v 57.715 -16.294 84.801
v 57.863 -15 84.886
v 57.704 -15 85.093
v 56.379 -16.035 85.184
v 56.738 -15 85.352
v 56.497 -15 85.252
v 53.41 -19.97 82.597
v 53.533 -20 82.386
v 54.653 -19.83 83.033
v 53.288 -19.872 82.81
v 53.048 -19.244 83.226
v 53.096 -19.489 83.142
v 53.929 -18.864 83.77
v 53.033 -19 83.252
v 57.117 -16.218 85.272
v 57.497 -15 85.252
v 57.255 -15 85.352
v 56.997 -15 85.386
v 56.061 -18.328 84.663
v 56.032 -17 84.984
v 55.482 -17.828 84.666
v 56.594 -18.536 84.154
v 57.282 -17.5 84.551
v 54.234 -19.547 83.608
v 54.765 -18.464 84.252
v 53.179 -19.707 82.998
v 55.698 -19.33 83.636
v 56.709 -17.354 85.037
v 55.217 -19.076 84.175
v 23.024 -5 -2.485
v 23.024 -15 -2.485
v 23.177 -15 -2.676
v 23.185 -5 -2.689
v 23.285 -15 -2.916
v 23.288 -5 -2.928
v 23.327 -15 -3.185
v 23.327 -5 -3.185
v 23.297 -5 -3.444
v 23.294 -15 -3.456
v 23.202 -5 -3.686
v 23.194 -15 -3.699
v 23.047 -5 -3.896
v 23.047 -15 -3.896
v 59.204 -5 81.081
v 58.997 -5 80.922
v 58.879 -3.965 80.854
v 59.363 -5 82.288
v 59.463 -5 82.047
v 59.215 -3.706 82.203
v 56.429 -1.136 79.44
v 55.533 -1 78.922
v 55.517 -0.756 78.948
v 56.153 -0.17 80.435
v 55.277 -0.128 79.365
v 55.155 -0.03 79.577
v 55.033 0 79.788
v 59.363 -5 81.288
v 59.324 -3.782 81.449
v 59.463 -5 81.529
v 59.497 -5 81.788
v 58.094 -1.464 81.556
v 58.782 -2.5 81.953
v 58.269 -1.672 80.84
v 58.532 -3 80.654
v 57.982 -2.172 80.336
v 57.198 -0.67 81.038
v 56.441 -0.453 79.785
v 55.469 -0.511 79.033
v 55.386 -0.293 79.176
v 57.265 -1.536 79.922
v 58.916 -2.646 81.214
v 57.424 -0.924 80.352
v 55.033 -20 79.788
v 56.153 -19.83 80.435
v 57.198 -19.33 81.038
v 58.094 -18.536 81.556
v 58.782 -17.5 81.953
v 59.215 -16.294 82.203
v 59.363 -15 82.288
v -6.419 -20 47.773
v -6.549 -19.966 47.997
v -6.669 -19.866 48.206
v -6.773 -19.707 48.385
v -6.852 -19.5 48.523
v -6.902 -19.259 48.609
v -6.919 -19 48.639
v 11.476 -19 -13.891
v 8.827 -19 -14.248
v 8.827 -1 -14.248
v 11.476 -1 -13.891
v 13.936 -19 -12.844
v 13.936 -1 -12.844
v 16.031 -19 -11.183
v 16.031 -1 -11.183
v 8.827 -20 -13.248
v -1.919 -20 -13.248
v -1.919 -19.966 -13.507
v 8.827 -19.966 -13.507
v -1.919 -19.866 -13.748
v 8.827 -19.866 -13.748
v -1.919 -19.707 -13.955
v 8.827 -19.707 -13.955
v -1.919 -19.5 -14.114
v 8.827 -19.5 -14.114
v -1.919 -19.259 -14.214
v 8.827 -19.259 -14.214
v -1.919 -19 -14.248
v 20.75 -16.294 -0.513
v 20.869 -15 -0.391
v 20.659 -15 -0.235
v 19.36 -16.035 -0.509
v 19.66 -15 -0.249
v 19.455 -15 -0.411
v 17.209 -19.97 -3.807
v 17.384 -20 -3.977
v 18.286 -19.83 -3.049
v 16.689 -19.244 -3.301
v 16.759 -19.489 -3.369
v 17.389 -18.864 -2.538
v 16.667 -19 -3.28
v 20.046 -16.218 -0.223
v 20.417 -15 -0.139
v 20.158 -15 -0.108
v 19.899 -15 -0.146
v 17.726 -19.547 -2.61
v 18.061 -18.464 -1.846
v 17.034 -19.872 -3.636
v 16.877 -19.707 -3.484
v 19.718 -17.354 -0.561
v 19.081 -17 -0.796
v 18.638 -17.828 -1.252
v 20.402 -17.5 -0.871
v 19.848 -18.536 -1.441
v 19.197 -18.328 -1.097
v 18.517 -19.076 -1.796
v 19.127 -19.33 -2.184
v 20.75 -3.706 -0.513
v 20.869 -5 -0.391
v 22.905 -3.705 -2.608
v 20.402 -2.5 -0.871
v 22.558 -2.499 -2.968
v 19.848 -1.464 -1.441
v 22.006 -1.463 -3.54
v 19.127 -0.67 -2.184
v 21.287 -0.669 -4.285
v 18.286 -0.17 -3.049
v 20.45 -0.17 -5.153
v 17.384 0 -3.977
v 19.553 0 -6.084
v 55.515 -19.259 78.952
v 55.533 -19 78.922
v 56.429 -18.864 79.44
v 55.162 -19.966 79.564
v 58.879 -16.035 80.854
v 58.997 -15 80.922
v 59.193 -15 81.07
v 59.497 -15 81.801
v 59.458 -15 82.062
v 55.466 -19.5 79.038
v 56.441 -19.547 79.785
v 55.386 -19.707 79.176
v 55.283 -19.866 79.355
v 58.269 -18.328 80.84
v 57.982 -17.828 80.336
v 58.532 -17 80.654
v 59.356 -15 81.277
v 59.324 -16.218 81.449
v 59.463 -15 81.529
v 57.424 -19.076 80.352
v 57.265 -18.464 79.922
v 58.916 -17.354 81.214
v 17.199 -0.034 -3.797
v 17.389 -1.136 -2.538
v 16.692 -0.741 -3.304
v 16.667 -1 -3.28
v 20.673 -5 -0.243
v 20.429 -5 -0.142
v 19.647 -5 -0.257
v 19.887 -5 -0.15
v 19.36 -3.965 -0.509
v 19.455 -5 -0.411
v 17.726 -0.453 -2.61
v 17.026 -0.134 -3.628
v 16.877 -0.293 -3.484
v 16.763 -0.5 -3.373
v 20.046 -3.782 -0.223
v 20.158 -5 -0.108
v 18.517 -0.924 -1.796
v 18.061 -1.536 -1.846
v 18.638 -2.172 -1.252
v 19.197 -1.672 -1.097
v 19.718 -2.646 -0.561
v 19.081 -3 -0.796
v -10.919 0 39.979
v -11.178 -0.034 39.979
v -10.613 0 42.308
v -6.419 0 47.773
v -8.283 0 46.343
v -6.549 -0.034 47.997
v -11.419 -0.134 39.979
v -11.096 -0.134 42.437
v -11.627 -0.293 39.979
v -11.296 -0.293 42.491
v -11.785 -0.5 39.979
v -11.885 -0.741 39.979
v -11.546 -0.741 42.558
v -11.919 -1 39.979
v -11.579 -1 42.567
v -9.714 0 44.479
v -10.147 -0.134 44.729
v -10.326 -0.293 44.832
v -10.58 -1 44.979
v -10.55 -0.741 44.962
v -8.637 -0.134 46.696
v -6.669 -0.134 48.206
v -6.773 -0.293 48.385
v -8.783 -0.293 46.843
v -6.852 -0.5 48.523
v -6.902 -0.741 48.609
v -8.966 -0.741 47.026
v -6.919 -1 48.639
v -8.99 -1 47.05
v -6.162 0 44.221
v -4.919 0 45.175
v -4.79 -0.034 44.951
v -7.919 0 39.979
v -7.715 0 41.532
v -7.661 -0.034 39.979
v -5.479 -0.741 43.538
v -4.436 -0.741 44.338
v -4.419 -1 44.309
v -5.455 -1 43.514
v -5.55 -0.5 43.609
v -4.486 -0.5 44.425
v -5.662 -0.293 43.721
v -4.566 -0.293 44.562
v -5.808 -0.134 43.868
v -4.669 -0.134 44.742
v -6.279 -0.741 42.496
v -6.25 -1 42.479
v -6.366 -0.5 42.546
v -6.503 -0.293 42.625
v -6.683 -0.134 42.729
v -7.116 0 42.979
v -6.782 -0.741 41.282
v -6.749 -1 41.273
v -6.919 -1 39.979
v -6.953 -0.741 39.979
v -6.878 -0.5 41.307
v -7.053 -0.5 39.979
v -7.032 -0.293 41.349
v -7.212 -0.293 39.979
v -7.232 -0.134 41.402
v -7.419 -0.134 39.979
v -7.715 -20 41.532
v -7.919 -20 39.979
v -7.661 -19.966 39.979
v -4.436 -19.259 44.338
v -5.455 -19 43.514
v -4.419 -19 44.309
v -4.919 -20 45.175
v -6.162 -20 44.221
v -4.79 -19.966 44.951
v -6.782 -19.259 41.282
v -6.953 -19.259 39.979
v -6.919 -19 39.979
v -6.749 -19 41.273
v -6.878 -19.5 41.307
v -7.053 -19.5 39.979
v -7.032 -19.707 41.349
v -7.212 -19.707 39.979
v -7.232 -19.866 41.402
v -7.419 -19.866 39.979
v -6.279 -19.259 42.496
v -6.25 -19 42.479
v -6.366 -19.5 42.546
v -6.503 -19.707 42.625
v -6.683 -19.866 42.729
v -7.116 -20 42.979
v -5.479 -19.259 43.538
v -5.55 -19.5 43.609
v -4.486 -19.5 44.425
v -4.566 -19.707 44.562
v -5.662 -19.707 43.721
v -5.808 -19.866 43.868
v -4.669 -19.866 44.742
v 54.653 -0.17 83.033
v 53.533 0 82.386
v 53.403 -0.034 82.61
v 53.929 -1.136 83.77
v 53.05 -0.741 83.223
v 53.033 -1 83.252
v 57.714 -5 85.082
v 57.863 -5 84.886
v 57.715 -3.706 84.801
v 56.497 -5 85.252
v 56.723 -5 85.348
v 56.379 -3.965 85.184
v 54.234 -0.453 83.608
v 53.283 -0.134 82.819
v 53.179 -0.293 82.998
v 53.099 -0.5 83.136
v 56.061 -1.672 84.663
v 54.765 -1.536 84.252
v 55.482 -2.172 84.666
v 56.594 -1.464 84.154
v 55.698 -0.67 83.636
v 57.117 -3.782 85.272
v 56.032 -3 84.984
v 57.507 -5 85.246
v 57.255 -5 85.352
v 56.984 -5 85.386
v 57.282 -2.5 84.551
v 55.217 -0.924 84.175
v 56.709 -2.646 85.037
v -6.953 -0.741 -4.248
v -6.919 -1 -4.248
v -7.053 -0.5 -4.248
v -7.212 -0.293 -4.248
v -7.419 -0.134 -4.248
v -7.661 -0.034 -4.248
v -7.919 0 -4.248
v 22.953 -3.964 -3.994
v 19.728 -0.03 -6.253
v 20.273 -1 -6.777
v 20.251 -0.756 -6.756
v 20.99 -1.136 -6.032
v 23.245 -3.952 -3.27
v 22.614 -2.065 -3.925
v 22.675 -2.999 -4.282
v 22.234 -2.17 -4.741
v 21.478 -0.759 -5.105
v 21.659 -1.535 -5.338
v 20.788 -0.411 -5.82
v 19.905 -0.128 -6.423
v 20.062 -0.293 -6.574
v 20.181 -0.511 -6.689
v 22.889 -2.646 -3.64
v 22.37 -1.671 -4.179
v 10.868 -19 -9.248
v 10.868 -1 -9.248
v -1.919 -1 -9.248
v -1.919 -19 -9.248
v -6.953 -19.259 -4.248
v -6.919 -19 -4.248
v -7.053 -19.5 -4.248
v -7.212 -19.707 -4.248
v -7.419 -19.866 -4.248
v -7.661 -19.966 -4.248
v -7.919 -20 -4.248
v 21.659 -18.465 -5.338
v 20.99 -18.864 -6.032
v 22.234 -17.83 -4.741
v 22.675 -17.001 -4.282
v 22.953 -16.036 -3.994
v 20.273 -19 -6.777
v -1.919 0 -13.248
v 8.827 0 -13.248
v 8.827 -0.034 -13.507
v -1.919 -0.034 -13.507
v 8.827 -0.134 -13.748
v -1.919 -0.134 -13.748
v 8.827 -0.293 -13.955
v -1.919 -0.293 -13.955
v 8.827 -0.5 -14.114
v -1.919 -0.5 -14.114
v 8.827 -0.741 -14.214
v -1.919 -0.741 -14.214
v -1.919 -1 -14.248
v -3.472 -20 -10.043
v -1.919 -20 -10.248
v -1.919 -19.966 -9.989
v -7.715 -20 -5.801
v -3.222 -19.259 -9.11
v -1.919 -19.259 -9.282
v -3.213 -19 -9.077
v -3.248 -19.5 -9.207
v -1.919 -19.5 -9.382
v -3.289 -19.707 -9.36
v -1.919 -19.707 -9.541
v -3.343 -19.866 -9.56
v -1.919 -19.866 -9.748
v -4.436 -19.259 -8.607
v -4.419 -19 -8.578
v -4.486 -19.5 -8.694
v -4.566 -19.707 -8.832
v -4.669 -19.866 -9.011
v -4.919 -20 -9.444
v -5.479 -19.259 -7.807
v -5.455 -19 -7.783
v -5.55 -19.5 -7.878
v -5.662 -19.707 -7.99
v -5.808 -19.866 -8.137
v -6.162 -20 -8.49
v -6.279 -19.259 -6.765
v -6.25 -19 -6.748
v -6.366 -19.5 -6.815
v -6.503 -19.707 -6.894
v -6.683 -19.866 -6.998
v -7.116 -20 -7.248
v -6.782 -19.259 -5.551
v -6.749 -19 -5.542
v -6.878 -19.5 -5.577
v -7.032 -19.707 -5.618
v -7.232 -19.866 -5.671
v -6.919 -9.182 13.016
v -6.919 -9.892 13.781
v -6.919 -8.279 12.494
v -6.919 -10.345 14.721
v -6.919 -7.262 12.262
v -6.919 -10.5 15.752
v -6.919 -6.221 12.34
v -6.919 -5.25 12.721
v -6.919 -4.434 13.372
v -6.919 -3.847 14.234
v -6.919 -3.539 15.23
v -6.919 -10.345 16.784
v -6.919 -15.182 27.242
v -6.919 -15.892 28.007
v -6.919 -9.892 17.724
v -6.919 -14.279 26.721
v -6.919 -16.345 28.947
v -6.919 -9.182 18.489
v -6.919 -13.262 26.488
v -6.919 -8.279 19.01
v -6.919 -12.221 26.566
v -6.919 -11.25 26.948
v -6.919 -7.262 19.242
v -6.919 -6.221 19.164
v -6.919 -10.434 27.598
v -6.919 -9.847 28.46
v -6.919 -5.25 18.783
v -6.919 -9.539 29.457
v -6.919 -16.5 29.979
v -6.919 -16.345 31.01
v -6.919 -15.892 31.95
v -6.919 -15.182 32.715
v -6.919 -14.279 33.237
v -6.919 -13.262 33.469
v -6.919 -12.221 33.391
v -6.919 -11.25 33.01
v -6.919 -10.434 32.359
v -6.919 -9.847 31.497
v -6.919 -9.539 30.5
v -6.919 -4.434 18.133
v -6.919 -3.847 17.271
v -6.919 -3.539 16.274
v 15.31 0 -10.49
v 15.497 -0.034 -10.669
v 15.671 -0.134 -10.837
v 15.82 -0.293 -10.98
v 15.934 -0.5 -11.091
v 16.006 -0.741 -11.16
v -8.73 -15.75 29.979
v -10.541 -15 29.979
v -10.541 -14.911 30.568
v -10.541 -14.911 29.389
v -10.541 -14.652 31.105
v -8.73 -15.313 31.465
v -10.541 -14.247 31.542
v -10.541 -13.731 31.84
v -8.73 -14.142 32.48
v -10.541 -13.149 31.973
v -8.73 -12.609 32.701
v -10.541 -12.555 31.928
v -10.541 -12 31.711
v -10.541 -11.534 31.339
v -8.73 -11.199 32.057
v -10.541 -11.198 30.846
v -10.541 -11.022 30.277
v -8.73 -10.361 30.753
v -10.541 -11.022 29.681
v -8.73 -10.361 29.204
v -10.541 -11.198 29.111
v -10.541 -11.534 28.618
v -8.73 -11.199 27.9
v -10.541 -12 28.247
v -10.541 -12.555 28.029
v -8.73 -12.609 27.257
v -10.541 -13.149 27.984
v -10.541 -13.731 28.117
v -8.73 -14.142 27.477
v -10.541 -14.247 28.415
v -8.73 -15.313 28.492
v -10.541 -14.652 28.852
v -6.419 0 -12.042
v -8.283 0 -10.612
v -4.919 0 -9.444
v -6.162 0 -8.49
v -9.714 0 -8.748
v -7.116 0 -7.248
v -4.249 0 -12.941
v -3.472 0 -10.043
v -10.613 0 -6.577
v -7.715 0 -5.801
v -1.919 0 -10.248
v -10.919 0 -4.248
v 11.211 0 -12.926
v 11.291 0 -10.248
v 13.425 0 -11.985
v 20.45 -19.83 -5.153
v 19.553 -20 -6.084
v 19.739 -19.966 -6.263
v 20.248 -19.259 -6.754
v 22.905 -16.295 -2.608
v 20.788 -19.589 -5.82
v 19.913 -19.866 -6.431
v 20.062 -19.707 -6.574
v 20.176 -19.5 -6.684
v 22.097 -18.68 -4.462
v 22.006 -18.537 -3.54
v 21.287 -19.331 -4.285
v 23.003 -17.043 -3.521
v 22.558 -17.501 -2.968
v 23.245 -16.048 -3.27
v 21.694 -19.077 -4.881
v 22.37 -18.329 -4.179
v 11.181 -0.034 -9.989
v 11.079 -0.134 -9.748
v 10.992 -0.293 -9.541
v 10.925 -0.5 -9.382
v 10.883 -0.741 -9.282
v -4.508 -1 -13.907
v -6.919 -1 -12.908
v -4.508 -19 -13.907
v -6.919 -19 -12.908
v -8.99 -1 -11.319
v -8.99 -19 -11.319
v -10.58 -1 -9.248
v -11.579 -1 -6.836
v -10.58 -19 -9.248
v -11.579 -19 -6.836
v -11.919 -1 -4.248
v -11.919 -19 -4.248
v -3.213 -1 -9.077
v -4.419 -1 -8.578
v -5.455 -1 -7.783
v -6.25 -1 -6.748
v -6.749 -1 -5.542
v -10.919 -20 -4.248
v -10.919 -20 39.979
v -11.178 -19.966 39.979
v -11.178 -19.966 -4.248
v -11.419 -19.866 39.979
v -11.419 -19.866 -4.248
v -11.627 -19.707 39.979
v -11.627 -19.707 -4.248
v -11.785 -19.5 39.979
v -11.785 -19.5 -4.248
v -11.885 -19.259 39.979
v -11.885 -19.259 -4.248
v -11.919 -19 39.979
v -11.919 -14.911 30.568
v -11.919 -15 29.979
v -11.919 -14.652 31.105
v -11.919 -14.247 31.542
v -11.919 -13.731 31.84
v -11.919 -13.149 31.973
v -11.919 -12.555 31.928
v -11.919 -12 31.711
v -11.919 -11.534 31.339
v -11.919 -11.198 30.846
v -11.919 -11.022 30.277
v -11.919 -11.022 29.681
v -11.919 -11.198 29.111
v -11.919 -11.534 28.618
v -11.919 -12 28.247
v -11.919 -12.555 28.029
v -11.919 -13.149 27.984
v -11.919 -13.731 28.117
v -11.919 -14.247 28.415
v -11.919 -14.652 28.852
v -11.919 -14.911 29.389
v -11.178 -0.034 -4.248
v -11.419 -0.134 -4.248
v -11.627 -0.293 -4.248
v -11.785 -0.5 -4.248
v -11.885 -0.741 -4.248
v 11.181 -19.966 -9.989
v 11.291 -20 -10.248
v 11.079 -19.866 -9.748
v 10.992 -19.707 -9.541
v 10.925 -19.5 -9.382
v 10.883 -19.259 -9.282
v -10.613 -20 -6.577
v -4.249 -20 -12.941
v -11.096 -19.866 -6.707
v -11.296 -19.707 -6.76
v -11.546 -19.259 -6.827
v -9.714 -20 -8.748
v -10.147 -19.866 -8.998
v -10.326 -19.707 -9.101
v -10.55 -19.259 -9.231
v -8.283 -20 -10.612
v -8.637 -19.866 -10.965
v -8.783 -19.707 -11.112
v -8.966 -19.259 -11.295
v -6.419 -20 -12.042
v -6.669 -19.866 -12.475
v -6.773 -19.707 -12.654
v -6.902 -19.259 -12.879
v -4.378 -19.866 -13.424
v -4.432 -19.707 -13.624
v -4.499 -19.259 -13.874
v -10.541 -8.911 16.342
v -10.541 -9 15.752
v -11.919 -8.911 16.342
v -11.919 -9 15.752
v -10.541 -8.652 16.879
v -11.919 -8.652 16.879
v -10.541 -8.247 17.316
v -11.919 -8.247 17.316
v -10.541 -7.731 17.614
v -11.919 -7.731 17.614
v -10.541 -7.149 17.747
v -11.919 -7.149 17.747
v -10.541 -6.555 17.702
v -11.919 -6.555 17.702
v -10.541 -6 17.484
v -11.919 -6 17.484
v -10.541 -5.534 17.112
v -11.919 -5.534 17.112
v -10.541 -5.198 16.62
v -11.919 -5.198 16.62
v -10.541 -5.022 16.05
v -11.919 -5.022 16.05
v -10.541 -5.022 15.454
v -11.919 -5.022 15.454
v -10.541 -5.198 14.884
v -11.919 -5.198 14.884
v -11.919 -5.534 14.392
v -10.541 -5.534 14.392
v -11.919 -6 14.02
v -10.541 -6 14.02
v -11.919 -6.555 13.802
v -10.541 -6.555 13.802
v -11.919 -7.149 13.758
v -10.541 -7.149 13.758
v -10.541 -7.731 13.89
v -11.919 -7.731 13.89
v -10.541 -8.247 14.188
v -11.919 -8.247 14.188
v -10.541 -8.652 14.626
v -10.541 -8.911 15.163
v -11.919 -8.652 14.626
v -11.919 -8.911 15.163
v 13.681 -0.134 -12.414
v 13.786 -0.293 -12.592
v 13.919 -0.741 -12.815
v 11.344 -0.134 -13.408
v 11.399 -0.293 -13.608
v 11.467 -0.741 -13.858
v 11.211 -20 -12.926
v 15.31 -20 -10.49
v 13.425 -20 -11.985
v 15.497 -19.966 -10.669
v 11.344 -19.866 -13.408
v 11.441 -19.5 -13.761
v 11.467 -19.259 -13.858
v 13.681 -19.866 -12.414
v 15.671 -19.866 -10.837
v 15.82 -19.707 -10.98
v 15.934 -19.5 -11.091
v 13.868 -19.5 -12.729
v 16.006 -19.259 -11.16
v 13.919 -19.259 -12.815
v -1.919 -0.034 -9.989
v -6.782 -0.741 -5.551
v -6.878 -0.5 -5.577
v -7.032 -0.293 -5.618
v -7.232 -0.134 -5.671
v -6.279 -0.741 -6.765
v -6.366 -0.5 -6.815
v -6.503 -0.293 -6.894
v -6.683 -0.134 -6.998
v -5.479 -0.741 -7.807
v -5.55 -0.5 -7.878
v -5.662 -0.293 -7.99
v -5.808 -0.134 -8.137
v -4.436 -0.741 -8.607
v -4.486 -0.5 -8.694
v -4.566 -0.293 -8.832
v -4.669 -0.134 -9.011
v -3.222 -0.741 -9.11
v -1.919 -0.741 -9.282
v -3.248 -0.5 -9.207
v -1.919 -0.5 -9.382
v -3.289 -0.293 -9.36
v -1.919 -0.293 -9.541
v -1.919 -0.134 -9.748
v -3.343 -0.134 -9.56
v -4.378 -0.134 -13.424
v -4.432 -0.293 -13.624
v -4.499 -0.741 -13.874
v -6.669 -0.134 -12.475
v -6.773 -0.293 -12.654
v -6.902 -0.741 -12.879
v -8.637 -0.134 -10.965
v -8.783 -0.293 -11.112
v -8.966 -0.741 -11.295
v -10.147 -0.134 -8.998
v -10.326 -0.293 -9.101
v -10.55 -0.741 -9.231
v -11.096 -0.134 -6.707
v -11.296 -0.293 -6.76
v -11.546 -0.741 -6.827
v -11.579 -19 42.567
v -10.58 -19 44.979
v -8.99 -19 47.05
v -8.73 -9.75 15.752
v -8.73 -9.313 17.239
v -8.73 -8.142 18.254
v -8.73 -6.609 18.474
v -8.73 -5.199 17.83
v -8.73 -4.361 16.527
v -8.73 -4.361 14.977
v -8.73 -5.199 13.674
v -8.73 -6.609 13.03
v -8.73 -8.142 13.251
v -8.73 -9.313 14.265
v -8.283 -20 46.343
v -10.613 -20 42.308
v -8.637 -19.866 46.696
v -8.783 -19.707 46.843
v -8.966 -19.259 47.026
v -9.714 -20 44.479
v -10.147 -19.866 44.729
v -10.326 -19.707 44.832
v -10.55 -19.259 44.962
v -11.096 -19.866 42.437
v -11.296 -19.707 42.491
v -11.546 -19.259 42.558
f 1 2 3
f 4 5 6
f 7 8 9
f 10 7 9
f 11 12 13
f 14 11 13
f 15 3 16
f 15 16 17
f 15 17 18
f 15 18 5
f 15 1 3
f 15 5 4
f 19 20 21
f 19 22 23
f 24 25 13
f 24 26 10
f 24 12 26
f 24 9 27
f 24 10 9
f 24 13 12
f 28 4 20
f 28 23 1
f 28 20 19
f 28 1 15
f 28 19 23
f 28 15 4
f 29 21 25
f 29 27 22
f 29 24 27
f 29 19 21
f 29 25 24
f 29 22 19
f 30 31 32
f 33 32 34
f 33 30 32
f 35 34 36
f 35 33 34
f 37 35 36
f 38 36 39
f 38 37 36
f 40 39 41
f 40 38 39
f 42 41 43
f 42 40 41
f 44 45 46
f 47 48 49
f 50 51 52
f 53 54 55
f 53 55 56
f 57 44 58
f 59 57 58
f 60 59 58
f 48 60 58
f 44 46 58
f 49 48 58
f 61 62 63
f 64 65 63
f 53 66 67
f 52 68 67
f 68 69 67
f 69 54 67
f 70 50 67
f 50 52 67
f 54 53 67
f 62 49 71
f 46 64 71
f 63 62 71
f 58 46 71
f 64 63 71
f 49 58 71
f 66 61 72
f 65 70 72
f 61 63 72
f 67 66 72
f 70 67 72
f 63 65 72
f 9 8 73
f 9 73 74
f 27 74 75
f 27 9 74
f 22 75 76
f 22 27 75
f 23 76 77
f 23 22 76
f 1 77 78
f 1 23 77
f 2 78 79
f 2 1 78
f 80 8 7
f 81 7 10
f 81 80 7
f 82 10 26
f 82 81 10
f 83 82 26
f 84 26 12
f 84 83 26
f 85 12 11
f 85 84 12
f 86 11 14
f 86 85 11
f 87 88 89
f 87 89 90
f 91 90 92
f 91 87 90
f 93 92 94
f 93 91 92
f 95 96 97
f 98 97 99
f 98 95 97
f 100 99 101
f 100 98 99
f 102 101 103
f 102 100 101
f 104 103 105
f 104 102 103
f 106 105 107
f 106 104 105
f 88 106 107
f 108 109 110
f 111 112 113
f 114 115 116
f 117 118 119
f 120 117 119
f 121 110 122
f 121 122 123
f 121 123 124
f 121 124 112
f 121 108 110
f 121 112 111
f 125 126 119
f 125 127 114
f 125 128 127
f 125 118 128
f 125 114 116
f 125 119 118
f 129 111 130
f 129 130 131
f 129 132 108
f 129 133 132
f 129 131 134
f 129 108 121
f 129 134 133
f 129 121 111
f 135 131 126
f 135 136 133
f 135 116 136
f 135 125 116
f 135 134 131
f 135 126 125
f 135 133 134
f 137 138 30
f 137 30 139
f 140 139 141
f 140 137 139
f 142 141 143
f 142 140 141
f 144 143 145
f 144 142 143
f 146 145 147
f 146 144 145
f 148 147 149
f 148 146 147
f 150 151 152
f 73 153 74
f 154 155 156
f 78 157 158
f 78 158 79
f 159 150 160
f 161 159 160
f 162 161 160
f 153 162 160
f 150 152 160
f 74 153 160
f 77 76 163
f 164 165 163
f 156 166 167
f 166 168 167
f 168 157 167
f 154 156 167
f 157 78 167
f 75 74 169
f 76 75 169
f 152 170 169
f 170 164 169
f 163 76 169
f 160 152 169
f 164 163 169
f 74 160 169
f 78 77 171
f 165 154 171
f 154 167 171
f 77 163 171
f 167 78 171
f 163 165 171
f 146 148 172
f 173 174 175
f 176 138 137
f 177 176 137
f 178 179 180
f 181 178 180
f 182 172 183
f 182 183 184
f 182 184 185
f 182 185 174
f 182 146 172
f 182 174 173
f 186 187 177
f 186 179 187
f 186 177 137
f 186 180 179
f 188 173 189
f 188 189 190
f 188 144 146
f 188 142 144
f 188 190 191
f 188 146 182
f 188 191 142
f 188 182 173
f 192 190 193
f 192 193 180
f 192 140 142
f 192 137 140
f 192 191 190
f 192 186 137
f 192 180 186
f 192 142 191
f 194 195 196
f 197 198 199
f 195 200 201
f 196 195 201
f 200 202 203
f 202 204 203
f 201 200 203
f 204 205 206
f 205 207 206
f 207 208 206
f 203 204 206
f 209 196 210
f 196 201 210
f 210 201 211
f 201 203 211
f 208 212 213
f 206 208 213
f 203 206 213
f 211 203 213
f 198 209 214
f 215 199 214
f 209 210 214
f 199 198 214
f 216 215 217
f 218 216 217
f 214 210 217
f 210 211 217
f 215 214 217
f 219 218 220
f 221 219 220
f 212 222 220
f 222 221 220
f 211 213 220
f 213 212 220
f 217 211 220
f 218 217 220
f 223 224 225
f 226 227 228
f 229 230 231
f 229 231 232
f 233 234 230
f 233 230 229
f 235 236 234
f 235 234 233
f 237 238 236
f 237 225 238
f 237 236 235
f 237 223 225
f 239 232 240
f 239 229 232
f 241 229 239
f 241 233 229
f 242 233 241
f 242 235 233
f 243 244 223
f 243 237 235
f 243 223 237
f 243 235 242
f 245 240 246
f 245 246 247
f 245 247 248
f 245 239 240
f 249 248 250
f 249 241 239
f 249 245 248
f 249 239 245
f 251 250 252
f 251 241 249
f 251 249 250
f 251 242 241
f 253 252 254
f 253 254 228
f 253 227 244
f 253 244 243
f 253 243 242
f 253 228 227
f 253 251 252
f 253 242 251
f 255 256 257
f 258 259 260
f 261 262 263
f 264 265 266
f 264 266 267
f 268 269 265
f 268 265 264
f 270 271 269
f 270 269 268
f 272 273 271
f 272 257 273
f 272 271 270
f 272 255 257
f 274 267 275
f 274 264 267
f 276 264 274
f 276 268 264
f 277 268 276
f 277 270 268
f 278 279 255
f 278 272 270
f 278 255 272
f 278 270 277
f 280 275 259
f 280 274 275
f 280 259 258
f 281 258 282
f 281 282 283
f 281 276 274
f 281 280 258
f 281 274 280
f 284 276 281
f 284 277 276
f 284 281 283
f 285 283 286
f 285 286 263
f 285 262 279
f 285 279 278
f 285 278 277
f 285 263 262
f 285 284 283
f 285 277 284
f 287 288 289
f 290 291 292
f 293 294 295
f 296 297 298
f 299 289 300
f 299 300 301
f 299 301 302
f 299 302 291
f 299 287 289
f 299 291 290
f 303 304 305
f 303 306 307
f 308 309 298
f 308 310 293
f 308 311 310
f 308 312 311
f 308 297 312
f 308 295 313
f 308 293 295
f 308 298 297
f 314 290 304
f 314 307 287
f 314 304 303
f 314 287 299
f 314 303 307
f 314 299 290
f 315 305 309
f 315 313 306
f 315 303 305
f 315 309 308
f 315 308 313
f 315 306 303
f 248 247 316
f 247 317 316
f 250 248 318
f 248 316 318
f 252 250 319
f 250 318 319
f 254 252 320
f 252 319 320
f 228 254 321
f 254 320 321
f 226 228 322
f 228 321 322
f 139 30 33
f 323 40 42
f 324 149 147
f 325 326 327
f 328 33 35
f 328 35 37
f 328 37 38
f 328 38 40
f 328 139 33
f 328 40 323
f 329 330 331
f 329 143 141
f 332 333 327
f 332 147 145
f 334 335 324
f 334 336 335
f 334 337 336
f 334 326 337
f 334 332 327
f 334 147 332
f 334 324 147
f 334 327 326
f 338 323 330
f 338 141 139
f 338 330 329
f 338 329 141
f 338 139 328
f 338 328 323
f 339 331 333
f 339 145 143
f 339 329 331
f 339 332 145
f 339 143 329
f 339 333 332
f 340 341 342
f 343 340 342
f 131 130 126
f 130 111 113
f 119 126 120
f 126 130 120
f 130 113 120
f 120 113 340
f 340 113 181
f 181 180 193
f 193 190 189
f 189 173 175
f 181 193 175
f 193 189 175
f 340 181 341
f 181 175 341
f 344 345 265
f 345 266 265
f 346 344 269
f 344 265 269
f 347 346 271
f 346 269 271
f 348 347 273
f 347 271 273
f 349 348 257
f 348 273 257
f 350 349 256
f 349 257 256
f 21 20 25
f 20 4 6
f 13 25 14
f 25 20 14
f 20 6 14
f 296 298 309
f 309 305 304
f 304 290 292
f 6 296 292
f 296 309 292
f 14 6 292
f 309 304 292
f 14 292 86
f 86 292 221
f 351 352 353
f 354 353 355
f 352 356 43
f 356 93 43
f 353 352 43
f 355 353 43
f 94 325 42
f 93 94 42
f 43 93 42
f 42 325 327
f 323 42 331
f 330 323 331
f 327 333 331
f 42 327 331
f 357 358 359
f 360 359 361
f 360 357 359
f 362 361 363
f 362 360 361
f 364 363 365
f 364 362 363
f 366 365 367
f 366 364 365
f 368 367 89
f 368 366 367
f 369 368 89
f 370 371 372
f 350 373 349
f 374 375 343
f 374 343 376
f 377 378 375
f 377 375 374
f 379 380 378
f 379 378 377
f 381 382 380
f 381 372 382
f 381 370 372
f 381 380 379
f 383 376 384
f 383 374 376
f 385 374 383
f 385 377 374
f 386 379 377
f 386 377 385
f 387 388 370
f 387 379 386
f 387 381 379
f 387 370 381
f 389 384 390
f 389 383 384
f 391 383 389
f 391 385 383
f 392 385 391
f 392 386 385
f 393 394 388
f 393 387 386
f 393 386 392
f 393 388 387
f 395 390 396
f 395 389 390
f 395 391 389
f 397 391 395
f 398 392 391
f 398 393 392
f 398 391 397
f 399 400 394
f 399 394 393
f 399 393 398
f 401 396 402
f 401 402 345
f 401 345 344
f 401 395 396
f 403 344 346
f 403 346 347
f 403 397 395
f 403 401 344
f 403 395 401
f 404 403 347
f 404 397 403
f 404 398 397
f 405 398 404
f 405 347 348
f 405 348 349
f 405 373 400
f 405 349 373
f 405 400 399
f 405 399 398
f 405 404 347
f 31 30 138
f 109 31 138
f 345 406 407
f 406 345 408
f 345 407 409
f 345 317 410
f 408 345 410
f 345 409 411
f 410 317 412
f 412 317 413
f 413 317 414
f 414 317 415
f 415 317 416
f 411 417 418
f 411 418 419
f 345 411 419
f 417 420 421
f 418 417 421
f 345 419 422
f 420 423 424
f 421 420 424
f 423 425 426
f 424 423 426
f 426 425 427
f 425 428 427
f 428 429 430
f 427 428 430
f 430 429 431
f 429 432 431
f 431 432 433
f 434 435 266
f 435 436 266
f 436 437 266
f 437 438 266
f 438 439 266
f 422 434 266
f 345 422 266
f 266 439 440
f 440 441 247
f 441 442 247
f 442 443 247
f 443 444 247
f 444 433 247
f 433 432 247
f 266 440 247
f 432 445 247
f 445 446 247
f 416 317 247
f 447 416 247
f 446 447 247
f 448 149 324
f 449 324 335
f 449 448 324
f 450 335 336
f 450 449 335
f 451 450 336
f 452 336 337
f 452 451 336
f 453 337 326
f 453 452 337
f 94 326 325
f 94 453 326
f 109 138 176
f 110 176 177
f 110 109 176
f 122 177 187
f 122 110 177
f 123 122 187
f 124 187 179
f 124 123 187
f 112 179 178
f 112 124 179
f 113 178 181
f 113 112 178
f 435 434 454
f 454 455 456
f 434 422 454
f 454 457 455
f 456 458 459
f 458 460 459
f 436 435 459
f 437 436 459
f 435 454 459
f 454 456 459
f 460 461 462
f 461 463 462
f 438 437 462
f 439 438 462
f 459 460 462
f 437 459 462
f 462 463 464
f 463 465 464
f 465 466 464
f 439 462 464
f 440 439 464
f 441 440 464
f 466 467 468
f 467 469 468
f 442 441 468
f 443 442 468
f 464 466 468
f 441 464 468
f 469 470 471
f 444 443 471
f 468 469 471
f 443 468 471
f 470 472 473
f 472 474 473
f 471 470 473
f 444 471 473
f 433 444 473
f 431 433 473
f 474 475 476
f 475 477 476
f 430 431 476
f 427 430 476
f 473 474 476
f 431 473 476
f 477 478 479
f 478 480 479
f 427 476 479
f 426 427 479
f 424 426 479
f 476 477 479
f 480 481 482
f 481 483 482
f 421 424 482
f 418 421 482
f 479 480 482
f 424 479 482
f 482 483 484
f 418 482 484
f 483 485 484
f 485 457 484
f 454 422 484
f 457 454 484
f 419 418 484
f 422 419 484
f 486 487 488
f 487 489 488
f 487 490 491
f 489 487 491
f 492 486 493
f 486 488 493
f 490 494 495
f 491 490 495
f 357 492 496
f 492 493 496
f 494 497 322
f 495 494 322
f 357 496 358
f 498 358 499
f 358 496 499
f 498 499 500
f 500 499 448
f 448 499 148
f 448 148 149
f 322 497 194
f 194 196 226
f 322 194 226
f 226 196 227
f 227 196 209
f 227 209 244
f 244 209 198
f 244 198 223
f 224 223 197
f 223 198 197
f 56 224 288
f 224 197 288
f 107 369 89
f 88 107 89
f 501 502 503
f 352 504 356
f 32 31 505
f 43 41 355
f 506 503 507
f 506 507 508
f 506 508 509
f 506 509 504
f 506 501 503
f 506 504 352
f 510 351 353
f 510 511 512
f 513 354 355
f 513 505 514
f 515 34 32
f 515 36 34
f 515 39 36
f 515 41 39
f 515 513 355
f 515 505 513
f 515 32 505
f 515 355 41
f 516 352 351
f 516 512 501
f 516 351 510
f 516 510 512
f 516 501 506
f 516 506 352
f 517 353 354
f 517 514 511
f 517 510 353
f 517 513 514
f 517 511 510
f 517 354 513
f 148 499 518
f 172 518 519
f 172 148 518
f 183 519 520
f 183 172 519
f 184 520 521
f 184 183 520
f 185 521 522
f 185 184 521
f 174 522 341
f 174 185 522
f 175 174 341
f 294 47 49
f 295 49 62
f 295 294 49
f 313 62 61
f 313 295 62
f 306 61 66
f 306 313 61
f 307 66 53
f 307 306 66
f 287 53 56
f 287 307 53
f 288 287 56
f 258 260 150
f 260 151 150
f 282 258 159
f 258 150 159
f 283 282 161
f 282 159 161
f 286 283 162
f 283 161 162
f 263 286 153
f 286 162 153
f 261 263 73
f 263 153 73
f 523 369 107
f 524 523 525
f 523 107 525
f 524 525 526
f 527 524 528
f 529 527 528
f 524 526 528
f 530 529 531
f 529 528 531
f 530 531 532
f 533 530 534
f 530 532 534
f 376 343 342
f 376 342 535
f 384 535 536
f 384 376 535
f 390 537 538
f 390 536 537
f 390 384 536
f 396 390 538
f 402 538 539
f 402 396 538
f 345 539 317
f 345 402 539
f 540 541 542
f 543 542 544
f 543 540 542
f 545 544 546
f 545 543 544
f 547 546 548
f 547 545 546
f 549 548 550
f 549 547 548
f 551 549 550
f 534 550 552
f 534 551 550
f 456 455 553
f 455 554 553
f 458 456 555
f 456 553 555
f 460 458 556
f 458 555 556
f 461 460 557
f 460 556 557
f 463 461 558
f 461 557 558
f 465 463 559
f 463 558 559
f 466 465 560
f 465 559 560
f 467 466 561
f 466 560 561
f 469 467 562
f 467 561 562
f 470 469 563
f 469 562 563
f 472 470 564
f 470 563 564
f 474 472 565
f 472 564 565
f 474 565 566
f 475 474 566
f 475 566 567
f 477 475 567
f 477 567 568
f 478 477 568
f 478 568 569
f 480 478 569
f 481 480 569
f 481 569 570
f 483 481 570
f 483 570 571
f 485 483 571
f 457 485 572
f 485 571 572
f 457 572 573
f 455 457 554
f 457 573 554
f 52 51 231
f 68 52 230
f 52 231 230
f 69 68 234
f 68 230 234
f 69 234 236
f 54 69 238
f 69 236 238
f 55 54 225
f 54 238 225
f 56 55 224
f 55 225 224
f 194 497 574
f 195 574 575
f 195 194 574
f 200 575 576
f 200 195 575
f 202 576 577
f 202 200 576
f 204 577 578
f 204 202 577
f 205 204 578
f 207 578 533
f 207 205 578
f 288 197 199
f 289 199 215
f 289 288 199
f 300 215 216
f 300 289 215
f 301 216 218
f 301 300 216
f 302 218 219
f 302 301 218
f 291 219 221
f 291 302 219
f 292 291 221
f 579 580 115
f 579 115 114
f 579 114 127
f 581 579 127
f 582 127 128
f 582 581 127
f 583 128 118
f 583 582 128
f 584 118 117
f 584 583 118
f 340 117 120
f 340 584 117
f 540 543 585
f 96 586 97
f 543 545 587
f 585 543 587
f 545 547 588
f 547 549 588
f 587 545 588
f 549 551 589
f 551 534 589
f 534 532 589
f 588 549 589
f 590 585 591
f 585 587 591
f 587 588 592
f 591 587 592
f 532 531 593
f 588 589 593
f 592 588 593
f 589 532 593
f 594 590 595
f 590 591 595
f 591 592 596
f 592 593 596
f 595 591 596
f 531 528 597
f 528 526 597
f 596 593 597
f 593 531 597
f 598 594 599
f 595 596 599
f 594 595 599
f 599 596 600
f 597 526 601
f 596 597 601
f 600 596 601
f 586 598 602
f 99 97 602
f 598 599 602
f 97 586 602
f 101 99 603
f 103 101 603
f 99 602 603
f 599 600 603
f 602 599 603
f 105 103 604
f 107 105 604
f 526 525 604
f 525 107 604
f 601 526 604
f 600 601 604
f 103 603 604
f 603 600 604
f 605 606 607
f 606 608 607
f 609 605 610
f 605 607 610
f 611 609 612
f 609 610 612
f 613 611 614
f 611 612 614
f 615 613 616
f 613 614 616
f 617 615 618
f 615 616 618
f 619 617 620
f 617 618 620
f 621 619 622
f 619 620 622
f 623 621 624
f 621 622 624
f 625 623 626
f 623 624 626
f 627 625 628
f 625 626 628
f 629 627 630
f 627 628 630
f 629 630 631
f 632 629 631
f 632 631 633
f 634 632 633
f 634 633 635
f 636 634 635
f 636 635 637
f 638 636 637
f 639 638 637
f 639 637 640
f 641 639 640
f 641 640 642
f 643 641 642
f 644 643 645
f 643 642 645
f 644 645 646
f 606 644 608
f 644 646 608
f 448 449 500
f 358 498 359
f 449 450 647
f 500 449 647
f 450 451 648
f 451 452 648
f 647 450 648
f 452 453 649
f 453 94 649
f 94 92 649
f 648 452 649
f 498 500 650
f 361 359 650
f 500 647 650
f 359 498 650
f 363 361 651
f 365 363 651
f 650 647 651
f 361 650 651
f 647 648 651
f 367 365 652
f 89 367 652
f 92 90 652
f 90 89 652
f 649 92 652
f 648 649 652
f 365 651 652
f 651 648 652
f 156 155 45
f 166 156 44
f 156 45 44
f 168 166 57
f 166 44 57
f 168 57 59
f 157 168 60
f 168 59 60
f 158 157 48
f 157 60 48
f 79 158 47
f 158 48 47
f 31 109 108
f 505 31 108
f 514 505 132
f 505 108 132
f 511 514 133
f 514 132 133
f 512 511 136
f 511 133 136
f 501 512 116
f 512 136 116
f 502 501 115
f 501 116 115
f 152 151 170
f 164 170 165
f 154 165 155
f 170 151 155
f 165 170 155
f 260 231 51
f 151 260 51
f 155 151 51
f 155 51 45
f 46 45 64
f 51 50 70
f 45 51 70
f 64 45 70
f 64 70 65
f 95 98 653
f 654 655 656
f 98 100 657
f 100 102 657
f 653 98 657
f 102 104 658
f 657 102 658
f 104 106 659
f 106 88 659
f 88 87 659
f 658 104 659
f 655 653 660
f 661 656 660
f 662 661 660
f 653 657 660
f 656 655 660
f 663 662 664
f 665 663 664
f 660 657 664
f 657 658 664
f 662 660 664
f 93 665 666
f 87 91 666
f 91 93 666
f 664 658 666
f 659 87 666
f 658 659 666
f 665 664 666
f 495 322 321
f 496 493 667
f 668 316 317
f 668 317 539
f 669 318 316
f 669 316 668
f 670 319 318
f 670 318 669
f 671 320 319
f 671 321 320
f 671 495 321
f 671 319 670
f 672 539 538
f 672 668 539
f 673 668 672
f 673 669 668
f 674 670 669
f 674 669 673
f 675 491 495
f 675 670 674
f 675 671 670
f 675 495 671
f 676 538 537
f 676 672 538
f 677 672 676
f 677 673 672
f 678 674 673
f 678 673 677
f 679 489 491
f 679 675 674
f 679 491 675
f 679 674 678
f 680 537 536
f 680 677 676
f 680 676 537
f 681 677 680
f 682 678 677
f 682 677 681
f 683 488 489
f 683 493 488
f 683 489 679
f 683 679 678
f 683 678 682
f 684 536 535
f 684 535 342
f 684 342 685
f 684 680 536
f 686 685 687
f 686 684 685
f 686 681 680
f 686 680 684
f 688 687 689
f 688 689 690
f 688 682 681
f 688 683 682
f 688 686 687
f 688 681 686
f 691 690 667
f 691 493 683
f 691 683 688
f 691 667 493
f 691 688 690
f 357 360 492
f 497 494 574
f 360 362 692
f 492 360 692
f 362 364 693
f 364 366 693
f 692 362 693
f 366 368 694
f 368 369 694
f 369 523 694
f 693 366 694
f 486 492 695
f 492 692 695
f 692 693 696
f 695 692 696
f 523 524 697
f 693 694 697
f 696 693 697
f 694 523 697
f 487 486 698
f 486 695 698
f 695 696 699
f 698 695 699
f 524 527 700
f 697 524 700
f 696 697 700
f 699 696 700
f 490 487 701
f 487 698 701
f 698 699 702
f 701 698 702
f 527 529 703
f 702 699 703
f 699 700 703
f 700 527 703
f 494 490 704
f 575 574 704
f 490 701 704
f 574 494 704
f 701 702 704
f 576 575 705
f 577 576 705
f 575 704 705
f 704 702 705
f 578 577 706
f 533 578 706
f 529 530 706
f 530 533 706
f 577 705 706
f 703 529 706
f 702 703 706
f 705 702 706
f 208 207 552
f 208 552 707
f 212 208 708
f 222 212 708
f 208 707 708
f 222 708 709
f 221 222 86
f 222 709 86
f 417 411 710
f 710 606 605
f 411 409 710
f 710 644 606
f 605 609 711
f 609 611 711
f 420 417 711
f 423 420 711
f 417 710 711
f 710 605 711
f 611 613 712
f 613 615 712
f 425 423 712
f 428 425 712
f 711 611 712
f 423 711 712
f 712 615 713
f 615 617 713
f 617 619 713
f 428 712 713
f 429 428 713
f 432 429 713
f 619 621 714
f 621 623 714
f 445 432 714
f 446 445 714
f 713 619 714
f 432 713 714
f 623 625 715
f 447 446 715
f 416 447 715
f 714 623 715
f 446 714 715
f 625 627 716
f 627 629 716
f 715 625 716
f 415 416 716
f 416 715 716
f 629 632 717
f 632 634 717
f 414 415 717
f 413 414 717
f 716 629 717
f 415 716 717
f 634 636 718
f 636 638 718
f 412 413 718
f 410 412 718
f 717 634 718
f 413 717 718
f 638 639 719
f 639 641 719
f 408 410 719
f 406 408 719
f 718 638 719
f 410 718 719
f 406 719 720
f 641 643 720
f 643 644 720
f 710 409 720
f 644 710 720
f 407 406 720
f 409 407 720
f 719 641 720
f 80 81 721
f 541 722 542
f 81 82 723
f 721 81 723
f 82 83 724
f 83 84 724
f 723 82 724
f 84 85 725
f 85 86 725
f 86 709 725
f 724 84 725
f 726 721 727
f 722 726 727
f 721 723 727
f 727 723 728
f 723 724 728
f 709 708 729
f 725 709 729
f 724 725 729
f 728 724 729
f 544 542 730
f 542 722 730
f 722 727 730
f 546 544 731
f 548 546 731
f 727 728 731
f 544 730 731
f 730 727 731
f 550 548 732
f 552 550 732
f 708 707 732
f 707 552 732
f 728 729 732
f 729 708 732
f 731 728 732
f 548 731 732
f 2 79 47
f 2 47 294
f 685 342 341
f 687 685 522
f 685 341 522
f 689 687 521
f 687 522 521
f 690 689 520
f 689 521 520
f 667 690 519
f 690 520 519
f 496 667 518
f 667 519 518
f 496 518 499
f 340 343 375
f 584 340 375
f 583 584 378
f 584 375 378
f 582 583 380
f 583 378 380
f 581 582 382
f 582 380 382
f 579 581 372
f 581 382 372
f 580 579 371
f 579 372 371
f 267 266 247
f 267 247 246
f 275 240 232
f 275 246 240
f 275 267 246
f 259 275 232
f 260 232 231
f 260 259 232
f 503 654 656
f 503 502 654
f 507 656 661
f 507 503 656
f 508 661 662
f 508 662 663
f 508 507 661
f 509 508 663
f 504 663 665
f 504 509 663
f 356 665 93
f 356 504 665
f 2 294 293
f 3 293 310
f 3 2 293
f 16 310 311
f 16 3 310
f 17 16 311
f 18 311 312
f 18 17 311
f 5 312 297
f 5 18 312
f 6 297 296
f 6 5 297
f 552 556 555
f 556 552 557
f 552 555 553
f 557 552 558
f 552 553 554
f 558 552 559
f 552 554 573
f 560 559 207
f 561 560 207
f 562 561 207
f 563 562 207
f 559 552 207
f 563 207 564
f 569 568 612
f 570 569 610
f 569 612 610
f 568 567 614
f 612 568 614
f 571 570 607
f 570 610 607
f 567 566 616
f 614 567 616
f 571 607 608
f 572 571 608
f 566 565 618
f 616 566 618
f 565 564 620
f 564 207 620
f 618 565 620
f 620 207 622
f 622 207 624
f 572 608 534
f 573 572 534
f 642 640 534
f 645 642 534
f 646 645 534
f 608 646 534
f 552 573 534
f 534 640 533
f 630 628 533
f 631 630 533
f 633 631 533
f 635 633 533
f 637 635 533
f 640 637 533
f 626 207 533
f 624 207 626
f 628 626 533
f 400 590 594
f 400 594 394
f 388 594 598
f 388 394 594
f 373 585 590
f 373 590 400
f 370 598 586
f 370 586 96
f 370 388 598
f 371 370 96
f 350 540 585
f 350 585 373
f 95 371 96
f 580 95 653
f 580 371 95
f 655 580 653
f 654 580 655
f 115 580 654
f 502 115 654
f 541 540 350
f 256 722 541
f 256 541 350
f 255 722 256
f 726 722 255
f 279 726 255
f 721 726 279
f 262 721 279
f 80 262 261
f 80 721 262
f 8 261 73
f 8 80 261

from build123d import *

# Parameters (mm, degrees)
F1_DEPTH        = 20
F2_R            = 10
F3_R            = 10
F5_R            = 5
F6_R            = 5
F7_R            = 5
F8_R            = 5
F9_R            = 5
F10_R           = 5
F11_R           = 1
F12_R           = 1
F13_R           = 1
F15_D           = 4
F15_CSINK_D     = 7
F15_CSINK_ANGLE = 45
F17_D           = 4
F17_CSINK_D     = 7
F17_CSINK_ANGLE = 45


# Not quite as in the source:
# - two fillets or chamfers of one size are made in one step


with BuildPart() as f1:
    # F0 (on Front) → F1 (new body)
    with BuildSketch(Plane.XZ):
        Polygon((-11.9194036352, -14.2478547741), (13.0805963648, -14.2478547741), (23.7375380173, -3.1786129853), (20.1516641766, 0.305853803), (10.8681305885, -9.2478547741), (-6.9194036352, -9.2478547741), (-6.9194036352, 42.86539388), (59.8626286675, 81.422018207), (57.3626286675, 85.7521452259), (-11.9194036352, 45.7521452259), align=None)
    extrude(amount=F1_DEPTH)

    # F2
    f2_edges = [f1.edges().sort_by_distance(p)[0] for p in [
        (-11.919404, -10, -14.247855),
    ]]
    fillet(f2_edges, radius=F2_R)

    # F3
    f3_edges = [f1.edges().sort_by_distance(p)[0] for p in [
        (-11.919404, -10, 45.752145),
        (13.080596, -10, -14.247855),
    ]]
    fillet(f3_edges, radius=F3_R)

    # F5
    f5_edges = [f1.edges().sort_by_distance(p)[0] for p in [
        (-6.919404, -10, -9.247855),
    ]]
    fillet(f5_edges, radius=F5_R)

    # F6
    f6_edges = [f1.edges().sort_by_distance(p)[0] for p in [
        (-6.919404, -10, 42.865394),
    ]]
    fillet(f6_edges, radius=F6_R)

    # F7
    f7_edges = [f1.edges().sort_by_distance(p)[0] for p in [
        (21.944601, -20, -1.43638),
    ]]
    fillet(f7_edges, radius=F7_R)

    # F8
    f8_edges = [f1.edges().sort_by_distance(p)[0] for p in [
        (21.944601, 0, -1.43638),
    ]]
    fillet(f8_edges, radius=F8_R)

    # F9
    f9_edges = [f1.edges().sort_by_distance(p)[0] for p in [
        (58.612629, -20, 83.587082),
    ]]
    fillet(f9_edges, radius=F9_R)

    # F10
    f10_edges = [f1.edges().sort_by_distance(p)[0] for p in [
        (58.612629, 0, 83.587082),
    ]]
    fillet(f10_edges, radius=F10_R)

    # F11
    f11_edges = [f1.edges().sort_by_distance(p)[0] for p in [
        (25.556549, -20, 61.615394),
    ]]
    fillet(f11_edges, radius=F11_R)

    # F12
    f12_edges = [f1.edges().sort_by_distance(p)[0] for p in [
        (18.150256, -20, -8.982058),
    ]]
    fillet(f12_edges, radius=F12_R)

    # F13
    f13_edges = [f1.edges().sort_by_distance(p)[0] for p in [
        (13.767664, -20, -6.263937),
        (13.767664, 0, -6.263937),
        (19.131087, -1.464466, -0.744424),
        (19.131087, -18.535534, -0.744424),
        (20.151664, -10, 0.305854),
    ]]
    fillet(f13_edges, radius=F13_R)

    # F15 (through all)
    with Locations(Plane.YZ.offset(-6.9194036352)):
        with Locations((-13, 29.978642534)):
            CounterSinkHole(F15_D / 2, F15_CSINK_D / 2, counter_sink_angle=F15_CSINK_ANGLE)

    # F17 (through all)
    with Locations(Plane.YZ.offset(-6.9194036352)):
        with Locations((-7, 15.7521452259)):
            CounterSinkHole(F17_D / 2, F17_CSINK_D / 2, counter_sink_angle=F17_CSINK_ANGLE)


solid = f1.part
